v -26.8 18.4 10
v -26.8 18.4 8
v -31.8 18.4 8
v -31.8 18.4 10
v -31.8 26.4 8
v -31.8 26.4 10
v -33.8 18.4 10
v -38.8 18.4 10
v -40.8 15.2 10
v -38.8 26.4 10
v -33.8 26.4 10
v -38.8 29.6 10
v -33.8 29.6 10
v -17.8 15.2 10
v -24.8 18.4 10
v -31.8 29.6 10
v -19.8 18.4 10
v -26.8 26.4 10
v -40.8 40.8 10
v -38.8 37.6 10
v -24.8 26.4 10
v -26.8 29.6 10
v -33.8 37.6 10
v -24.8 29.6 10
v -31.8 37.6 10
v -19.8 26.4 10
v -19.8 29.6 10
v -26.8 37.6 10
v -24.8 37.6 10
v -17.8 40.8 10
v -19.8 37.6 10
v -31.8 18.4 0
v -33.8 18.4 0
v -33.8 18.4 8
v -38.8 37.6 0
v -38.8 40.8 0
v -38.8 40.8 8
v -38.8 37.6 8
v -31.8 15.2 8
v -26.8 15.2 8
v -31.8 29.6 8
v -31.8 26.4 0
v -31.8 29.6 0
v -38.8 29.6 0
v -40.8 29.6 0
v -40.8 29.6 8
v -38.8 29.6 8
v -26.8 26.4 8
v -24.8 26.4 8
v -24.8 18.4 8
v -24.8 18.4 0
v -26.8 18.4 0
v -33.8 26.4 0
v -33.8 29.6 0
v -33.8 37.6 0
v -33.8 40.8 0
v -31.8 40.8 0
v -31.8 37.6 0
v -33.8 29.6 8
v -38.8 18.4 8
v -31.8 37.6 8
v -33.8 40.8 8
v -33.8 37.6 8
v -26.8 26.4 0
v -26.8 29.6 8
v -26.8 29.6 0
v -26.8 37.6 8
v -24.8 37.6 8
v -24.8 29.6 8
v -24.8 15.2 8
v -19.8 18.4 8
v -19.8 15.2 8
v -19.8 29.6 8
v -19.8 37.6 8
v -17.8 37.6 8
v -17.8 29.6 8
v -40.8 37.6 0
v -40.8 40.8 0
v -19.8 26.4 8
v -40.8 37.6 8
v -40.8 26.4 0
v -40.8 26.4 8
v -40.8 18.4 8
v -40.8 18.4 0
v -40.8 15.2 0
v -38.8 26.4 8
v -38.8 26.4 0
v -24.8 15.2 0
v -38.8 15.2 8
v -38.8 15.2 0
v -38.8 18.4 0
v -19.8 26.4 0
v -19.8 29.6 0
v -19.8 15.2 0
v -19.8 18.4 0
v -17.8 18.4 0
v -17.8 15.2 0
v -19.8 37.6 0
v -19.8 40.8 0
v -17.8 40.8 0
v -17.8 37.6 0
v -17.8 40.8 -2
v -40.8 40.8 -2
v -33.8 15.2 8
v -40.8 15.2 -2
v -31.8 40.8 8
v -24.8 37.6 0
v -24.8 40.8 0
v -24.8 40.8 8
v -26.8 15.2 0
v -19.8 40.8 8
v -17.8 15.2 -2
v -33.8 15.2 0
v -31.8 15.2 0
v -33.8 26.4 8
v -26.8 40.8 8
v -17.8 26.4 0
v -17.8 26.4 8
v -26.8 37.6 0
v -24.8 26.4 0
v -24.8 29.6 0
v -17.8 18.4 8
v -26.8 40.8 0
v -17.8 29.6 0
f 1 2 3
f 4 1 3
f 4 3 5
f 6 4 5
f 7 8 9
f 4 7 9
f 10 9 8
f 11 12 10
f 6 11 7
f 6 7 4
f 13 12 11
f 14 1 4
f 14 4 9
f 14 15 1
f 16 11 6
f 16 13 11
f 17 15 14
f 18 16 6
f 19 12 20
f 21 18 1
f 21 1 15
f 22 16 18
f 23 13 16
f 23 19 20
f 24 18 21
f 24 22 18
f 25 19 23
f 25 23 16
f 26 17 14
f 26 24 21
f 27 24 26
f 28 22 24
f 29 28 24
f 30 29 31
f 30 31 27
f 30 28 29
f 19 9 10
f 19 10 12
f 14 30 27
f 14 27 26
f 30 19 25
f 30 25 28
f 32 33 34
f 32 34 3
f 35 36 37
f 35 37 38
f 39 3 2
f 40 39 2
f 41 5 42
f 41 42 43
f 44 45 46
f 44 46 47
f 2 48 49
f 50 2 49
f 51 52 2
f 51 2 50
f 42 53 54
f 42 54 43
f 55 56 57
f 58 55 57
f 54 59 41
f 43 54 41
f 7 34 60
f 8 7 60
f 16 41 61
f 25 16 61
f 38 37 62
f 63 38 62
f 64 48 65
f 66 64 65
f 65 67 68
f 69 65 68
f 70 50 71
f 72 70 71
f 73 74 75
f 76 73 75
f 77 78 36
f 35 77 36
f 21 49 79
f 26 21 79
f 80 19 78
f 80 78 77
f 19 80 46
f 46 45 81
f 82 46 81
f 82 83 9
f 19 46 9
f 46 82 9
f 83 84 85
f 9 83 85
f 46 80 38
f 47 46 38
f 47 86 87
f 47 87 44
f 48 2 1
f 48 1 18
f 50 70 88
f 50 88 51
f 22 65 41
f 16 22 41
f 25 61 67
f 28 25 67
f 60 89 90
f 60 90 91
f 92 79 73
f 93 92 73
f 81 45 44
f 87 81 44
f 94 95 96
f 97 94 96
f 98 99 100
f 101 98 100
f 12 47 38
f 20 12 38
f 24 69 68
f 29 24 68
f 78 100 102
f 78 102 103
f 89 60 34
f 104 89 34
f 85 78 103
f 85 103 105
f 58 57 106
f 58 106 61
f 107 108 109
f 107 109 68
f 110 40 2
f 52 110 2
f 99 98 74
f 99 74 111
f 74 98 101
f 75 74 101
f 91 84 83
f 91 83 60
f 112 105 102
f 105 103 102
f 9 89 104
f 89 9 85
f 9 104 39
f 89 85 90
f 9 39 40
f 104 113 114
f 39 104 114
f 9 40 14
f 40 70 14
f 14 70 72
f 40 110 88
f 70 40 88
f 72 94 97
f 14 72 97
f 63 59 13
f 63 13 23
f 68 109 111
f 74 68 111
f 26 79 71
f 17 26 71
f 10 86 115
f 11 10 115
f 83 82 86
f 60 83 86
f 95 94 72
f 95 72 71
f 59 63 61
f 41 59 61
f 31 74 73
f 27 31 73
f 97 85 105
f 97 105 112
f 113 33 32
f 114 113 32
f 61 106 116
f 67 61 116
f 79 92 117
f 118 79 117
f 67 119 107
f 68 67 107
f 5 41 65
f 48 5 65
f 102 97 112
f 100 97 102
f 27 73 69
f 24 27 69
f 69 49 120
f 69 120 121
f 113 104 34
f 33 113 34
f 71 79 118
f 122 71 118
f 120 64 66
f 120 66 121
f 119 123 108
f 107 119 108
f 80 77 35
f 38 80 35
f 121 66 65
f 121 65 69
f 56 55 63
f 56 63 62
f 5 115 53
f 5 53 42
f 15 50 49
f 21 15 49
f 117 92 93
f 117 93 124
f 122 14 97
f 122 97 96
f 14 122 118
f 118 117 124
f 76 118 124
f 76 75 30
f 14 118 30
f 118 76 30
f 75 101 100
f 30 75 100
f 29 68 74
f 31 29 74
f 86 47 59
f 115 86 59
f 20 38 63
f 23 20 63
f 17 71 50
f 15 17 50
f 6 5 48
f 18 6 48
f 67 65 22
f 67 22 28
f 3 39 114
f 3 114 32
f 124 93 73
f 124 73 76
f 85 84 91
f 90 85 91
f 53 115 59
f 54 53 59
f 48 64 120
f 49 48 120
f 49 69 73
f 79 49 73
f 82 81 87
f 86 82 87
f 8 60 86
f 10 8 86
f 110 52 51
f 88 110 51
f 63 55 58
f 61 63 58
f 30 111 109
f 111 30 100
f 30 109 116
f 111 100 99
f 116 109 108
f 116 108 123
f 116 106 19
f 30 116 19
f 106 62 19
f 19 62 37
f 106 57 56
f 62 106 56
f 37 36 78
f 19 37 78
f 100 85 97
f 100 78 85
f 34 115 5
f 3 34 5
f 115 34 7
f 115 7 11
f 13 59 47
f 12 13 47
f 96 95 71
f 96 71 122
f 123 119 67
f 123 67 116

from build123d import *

# Parameters (mm, degrees)
F0_W     = 5
F0_H     = 3.2
F0_W_2   = 2
F0_H_2   = 8
F1_DEPTH = 2
F2_DEPTH = 10
F3_DEPTH = 8


with BuildPart() as f1:
    # F0 (on Top) → F1 (new body)
    with BuildSketch(Plane.XY):
        with Locations((-36.3, 16.8)):
            Rectangle(F0_W, F0_H)
        with Locations((-25.8, 28)):
            Rectangle(F0_W_2, F0_H)
        with Locations((-29.3, 33.6)):
            Rectangle(F0_W, F0_H_2)
        with Locations((-22.3, 33.6)):
            Rectangle(F0_W, F0_H_2)
        with Locations((-36.3, 28)):
            Rectangle(F0_W, F0_H)
        with Locations((-22.3, 16.8)):
            Rectangle(F0_W, F0_H)
        with Locations((-18.8, 22.4)):
            Rectangle(F0_W_2, F0_H_2)
        with Locations((-25.8, 16.8)):
            Rectangle(F0_W_2, F0_H)
        with Locations((-39.8, 22.4)):
            Rectangle(F0_W_2, F0_H_2)
        with Locations((-29.3, 22.4)):
            Rectangle(F0_W, F0_H_2)
        with Locations((-18.8, 16.8)):
            Rectangle(F0_W_2, F0_H)
        with Locations((-39.8, 16.8)):
            Rectangle(F0_W_2, F0_H)
        Polygon((-38.8, 40.8), (-38.8, 39.2), (-38.8, 37.6), (-33.8, 37.6), (-33.8, 39.2), (-33.8, 40.8), align=None)
        Polygon((-26.8, 40.8), (-31.8, 40.8), (-31.8, 39.2), (-31.8, 37.6), (-26.8, 37.6), (-26.8, 39.2), align=None)
        Polygon((-19.8, 40.8), (-24.8, 40.8), (-24.8, 39.2), (-24.8, 37.6), (-19.8, 37.6), (-19.8, 39.2), align=None)
        with Locations((-18.8, 33.6)):
            Rectangle(F0_W_2, F0_H_2)
        with Locations((-39.8, 33.6)):
            Rectangle(F0_W_2, F0_H_2)
        with Locations((-18.8, 28)):
            Rectangle(F0_W_2, F0_H)
        with Locations((-39.8, 28)):
            Rectangle(F0_W_2, F0_H)
        with Locations((-29.3, 28)):
            Rectangle(F0_W, F0_H)
        with Locations((-32.8, 33.6)):
            Rectangle(F0_W_2, F0_H_2)
        with Locations((-25.8, 33.6)):
            Rectangle(F0_W_2, F0_H_2)
        with Locations((-22.3, 22.4)):
            Rectangle(F0_W, F0_H_2)
        with Locations((-29.3, 16.8)):
            Rectangle(F0_W, F0_H)
        with Locations((-32.8, 22.4)):
            Rectangle(F0_W_2, F0_H_2)
        with Locations((-32.8, 28)):
            Rectangle(F0_W_2, F0_H)
        with Locations((-36.3, 33.6)):
            Rectangle(F0_W, F0_H_2)
        with Locations((-32.8, 16.8)):
            Rectangle(F0_W_2, F0_H)
        with Locations((-36.3, 22.4)):
            Rectangle(F0_W, F0_H_2)
        with Locations((-25.8, 22.4)):
            Rectangle(F0_W_2, F0_H_2)
        with Locations((-22.3, 28)):
            Rectangle(F0_W, F0_H)
        Polygon((-38.8, 37.6), (-38.8, 39.2), (-38.8, 40.8), (-40.8, 40.8), (-40.8, 37.6), align=None)
        Polygon((-17.8, 40.8), (-19.8, 40.8), (-19.8, 39.2), (-19.8, 37.6), (-17.8, 37.6), (-17.8, 39.2), align=None)
        Polygon((-31.8, 40.8), (-33.8, 40.8), (-33.8, 39.2), (-33.8, 37.6), (-31.8, 37.6), (-31.8, 39.2), align=None)
        Polygon((-24.8, 40.8), (-26.8, 40.8), (-26.8, 39.2), (-26.8, 37.6), (-24.8, 37.6), (-24.8, 39.2), align=None)
    extrude(amount=-F1_DEPTH)


with BuildPart() as f2:
    # F0 (on Top) → F2 (new body)
    with BuildSketch(Plane.XY):
        Polygon((-38.8, 37.6), (-38.8, 39.2), (-38.8, 40.8), (-40.8, 40.8), (-40.8, 37.6), align=None)
        Polygon((-38.8, 40.8), (-38.8, 39.2), (-38.8, 37.6), (-33.8, 37.6), (-33.8, 39.2), (-33.8, 40.8), align=None)
        Polygon((-26.8, 40.8), (-31.8, 40.8), (-31.8, 39.2), (-31.8, 37.6), (-26.8, 37.6), (-26.8, 39.2), align=None)
        Polygon((-31.8, 40.8), (-33.8, 40.8), (-33.8, 39.2), (-33.8, 37.6), (-31.8, 37.6), (-31.8, 39.2), align=None)
        Polygon((-24.8, 40.8), (-26.8, 40.8), (-26.8, 39.2), (-26.8, 37.6), (-24.8, 37.6), (-24.8, 39.2), align=None)
        Polygon((-19.8, 40.8), (-24.8, 40.8), (-24.8, 39.2), (-24.8, 37.6), (-19.8, 37.6), (-19.8, 39.2), align=None)
        Polygon((-17.8, 40.8), (-19.8, 40.8), (-19.8, 39.2), (-19.8, 37.6), (-17.8, 37.6), (-17.8, 39.2), align=None)
        with Locations((-18.8, 33.6)):
            Rectangle(F0_W_2, F0_H_2)
        with Locations((-18.8, 28)):
            Rectangle(F0_W_2, F0_H)
        with Locations((-18.8, 22.4)):
            Rectangle(F0_W_2, F0_H_2)
        with Locations((-18.8, 16.8)):
            Rectangle(F0_W_2, F0_H)
        with Locations((-22.3, 16.8)):
            Rectangle(F0_W, F0_H)
        with Locations((-25.8, 16.8)):
            Rectangle(F0_W_2, F0_H)
        with Locations((-29.3, 16.8)):
            Rectangle(F0_W, F0_H)
        with Locations((-32.8, 16.8)):
            Rectangle(F0_W_2, F0_H)
        with Locations((-36.3, 16.8)):
            Rectangle(F0_W, F0_H)
        with Locations((-39.8, 16.8)):
            Rectangle(F0_W_2, F0_H)
        with Locations((-39.8, 22.4)):
            Rectangle(F0_W_2, F0_H_2)
        with Locations((-39.8, 28)):
            Rectangle(F0_W_2, F0_H)
        with Locations((-39.8, 33.6)):
            Rectangle(F0_W_2, F0_H_2)
        with Locations((-36.3, 28)):
            Rectangle(F0_W, F0_H)
        with Locations((-32.8, 28)):
            Rectangle(F0_W_2, F0_H)
        with Locations((-32.8, 33.6)):
            Rectangle(F0_W_2, F0_H_2)
        with Locations((-32.8, 22.4)):
            Rectangle(F0_W_2, F0_H_2)
        with Locations((-29.3, 28)):
            Rectangle(F0_W, F0_H)
        with Locations((-22.3, 28)):
            Rectangle(F0_W, F0_H)
        with Locations((-25.8, 28)):
            Rectangle(F0_W_2, F0_H)
        with Locations((-25.8, 33.6)):
            Rectangle(F0_W_2, F0_H_2)
        with Locations((-25.8, 22.4)):
            Rectangle(F0_W_2, F0_H_2)
    extrude(amount=F2_DEPTH)

    # F0 (on Top) → F3 (cut)
    with BuildSketch(Plane.XY):
        with Locations((-39.8, 33.6)):
            Rectangle(F0_W_2, F0_H_2)
        Polygon((-38.8, 40.8), (-38.8, 39.2), (-38.8, 37.6), (-33.8, 37.6), (-33.8, 39.2), (-33.8, 40.8), align=None)
        Polygon((-26.8, 40.8), (-31.8, 40.8), (-31.8, 39.2), (-31.8, 37.6), (-26.8, 37.6), (-26.8, 39.2), align=None)
        Polygon((-19.8, 40.8), (-24.8, 40.8), (-24.8, 39.2), (-24.8, 37.6), (-19.8, 37.6), (-19.8, 39.2), align=None)
        with Locations((-18.8, 33.6)):
            Rectangle(F0_W_2, F0_H_2)
        with Locations((-18.8, 22.4)):
            Rectangle(F0_W_2, F0_H_2)
        with Locations((-25.8, 22.4)):
            Rectangle(F0_W_2, F0_H_2)
        with Locations((-32.8, 22.4)):
            Rectangle(F0_W_2, F0_H_2)
        with Locations((-39.8, 22.4)):
            Rectangle(F0_W_2, F0_H_2)
        with Locations((-36.3, 16.8)):
            Rectangle(F0_W, F0_H)
        with Locations((-29.3, 16.8)):
            Rectangle(F0_W, F0_H)
        with Locations((-22.3, 16.8)):
            Rectangle(F0_W, F0_H)
        with Locations((-22.3, 28)):
            Rectangle(F0_W, F0_H)
        with Locations((-29.3, 28)):
            Rectangle(F0_W, F0_H)
        with Locations((-36.3, 28)):
            Rectangle(F0_W, F0_H)
        with Locations((-32.8, 33.6)):
            Rectangle(F0_W_2, F0_H_2)
        with Locations((-25.8, 33.6)):
            Rectangle(F0_W_2, F0_H_2)
    extrude(amount=F3_DEPTH, mode=Mode.SUBTRACT)


solid = Compound([f1.part, f2.part])
